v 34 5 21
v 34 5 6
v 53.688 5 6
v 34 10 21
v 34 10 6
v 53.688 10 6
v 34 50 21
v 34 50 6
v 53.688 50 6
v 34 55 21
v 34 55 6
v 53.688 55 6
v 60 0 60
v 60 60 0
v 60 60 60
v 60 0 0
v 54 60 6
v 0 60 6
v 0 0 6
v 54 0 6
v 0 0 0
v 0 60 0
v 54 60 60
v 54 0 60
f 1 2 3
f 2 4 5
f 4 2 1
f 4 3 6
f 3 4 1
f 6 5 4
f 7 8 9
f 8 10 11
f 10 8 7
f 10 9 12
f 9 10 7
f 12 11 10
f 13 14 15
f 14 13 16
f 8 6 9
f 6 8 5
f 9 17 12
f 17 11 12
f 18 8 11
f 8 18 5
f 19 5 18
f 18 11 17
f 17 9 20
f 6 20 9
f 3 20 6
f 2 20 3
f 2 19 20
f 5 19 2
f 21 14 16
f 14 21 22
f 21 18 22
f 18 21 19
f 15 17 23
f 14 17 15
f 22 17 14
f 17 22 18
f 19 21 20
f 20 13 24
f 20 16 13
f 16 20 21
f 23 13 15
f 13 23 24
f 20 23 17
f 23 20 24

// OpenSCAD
$fn = 32;

// ----------------------------------------------------------------------
// Rib bracket: 2-gusset L bracket
// ----------------------------------------------------------------------

// --- parameters (mm) ---
base_l = 60;              // foot length, X
base_w = 60;              // foot width, Y
base_t = 6;               // foot thickness
plate_t = 6;              // upright plate thickness
plate_h = 60;             // overall height
gus_l = 20;               // gusset leg along the foot
gus_h = 16;               // gusset height
gus_t = 5;                // gusset thickness
gus_edge = 5;             // gusset margin from the foot edge
n_gus = 2;                // gusset count

gus_pitch = (base_w - 2 * gus_edge - gus_t) / (n_gus - 1);  // gusset pitch

union() {
  cube([base_l, base_w, base_t]);
  translate([base_l - plate_t, 0, base_t - 1])
    cube([plate_t, base_w, plate_h - base_t + 1]);
  for (i = [0 : n_gus - 1])
    translate([base_l - plate_t - gus_l, gus_edge + i * gus_pitch, base_t - 1])
      rotate([-90, 0, 0])
        linear_extrude(height = gus_t)
          polygon(points = [[0, 0], [gus_l + 1, 0], [0, -gus_h]]);
}
